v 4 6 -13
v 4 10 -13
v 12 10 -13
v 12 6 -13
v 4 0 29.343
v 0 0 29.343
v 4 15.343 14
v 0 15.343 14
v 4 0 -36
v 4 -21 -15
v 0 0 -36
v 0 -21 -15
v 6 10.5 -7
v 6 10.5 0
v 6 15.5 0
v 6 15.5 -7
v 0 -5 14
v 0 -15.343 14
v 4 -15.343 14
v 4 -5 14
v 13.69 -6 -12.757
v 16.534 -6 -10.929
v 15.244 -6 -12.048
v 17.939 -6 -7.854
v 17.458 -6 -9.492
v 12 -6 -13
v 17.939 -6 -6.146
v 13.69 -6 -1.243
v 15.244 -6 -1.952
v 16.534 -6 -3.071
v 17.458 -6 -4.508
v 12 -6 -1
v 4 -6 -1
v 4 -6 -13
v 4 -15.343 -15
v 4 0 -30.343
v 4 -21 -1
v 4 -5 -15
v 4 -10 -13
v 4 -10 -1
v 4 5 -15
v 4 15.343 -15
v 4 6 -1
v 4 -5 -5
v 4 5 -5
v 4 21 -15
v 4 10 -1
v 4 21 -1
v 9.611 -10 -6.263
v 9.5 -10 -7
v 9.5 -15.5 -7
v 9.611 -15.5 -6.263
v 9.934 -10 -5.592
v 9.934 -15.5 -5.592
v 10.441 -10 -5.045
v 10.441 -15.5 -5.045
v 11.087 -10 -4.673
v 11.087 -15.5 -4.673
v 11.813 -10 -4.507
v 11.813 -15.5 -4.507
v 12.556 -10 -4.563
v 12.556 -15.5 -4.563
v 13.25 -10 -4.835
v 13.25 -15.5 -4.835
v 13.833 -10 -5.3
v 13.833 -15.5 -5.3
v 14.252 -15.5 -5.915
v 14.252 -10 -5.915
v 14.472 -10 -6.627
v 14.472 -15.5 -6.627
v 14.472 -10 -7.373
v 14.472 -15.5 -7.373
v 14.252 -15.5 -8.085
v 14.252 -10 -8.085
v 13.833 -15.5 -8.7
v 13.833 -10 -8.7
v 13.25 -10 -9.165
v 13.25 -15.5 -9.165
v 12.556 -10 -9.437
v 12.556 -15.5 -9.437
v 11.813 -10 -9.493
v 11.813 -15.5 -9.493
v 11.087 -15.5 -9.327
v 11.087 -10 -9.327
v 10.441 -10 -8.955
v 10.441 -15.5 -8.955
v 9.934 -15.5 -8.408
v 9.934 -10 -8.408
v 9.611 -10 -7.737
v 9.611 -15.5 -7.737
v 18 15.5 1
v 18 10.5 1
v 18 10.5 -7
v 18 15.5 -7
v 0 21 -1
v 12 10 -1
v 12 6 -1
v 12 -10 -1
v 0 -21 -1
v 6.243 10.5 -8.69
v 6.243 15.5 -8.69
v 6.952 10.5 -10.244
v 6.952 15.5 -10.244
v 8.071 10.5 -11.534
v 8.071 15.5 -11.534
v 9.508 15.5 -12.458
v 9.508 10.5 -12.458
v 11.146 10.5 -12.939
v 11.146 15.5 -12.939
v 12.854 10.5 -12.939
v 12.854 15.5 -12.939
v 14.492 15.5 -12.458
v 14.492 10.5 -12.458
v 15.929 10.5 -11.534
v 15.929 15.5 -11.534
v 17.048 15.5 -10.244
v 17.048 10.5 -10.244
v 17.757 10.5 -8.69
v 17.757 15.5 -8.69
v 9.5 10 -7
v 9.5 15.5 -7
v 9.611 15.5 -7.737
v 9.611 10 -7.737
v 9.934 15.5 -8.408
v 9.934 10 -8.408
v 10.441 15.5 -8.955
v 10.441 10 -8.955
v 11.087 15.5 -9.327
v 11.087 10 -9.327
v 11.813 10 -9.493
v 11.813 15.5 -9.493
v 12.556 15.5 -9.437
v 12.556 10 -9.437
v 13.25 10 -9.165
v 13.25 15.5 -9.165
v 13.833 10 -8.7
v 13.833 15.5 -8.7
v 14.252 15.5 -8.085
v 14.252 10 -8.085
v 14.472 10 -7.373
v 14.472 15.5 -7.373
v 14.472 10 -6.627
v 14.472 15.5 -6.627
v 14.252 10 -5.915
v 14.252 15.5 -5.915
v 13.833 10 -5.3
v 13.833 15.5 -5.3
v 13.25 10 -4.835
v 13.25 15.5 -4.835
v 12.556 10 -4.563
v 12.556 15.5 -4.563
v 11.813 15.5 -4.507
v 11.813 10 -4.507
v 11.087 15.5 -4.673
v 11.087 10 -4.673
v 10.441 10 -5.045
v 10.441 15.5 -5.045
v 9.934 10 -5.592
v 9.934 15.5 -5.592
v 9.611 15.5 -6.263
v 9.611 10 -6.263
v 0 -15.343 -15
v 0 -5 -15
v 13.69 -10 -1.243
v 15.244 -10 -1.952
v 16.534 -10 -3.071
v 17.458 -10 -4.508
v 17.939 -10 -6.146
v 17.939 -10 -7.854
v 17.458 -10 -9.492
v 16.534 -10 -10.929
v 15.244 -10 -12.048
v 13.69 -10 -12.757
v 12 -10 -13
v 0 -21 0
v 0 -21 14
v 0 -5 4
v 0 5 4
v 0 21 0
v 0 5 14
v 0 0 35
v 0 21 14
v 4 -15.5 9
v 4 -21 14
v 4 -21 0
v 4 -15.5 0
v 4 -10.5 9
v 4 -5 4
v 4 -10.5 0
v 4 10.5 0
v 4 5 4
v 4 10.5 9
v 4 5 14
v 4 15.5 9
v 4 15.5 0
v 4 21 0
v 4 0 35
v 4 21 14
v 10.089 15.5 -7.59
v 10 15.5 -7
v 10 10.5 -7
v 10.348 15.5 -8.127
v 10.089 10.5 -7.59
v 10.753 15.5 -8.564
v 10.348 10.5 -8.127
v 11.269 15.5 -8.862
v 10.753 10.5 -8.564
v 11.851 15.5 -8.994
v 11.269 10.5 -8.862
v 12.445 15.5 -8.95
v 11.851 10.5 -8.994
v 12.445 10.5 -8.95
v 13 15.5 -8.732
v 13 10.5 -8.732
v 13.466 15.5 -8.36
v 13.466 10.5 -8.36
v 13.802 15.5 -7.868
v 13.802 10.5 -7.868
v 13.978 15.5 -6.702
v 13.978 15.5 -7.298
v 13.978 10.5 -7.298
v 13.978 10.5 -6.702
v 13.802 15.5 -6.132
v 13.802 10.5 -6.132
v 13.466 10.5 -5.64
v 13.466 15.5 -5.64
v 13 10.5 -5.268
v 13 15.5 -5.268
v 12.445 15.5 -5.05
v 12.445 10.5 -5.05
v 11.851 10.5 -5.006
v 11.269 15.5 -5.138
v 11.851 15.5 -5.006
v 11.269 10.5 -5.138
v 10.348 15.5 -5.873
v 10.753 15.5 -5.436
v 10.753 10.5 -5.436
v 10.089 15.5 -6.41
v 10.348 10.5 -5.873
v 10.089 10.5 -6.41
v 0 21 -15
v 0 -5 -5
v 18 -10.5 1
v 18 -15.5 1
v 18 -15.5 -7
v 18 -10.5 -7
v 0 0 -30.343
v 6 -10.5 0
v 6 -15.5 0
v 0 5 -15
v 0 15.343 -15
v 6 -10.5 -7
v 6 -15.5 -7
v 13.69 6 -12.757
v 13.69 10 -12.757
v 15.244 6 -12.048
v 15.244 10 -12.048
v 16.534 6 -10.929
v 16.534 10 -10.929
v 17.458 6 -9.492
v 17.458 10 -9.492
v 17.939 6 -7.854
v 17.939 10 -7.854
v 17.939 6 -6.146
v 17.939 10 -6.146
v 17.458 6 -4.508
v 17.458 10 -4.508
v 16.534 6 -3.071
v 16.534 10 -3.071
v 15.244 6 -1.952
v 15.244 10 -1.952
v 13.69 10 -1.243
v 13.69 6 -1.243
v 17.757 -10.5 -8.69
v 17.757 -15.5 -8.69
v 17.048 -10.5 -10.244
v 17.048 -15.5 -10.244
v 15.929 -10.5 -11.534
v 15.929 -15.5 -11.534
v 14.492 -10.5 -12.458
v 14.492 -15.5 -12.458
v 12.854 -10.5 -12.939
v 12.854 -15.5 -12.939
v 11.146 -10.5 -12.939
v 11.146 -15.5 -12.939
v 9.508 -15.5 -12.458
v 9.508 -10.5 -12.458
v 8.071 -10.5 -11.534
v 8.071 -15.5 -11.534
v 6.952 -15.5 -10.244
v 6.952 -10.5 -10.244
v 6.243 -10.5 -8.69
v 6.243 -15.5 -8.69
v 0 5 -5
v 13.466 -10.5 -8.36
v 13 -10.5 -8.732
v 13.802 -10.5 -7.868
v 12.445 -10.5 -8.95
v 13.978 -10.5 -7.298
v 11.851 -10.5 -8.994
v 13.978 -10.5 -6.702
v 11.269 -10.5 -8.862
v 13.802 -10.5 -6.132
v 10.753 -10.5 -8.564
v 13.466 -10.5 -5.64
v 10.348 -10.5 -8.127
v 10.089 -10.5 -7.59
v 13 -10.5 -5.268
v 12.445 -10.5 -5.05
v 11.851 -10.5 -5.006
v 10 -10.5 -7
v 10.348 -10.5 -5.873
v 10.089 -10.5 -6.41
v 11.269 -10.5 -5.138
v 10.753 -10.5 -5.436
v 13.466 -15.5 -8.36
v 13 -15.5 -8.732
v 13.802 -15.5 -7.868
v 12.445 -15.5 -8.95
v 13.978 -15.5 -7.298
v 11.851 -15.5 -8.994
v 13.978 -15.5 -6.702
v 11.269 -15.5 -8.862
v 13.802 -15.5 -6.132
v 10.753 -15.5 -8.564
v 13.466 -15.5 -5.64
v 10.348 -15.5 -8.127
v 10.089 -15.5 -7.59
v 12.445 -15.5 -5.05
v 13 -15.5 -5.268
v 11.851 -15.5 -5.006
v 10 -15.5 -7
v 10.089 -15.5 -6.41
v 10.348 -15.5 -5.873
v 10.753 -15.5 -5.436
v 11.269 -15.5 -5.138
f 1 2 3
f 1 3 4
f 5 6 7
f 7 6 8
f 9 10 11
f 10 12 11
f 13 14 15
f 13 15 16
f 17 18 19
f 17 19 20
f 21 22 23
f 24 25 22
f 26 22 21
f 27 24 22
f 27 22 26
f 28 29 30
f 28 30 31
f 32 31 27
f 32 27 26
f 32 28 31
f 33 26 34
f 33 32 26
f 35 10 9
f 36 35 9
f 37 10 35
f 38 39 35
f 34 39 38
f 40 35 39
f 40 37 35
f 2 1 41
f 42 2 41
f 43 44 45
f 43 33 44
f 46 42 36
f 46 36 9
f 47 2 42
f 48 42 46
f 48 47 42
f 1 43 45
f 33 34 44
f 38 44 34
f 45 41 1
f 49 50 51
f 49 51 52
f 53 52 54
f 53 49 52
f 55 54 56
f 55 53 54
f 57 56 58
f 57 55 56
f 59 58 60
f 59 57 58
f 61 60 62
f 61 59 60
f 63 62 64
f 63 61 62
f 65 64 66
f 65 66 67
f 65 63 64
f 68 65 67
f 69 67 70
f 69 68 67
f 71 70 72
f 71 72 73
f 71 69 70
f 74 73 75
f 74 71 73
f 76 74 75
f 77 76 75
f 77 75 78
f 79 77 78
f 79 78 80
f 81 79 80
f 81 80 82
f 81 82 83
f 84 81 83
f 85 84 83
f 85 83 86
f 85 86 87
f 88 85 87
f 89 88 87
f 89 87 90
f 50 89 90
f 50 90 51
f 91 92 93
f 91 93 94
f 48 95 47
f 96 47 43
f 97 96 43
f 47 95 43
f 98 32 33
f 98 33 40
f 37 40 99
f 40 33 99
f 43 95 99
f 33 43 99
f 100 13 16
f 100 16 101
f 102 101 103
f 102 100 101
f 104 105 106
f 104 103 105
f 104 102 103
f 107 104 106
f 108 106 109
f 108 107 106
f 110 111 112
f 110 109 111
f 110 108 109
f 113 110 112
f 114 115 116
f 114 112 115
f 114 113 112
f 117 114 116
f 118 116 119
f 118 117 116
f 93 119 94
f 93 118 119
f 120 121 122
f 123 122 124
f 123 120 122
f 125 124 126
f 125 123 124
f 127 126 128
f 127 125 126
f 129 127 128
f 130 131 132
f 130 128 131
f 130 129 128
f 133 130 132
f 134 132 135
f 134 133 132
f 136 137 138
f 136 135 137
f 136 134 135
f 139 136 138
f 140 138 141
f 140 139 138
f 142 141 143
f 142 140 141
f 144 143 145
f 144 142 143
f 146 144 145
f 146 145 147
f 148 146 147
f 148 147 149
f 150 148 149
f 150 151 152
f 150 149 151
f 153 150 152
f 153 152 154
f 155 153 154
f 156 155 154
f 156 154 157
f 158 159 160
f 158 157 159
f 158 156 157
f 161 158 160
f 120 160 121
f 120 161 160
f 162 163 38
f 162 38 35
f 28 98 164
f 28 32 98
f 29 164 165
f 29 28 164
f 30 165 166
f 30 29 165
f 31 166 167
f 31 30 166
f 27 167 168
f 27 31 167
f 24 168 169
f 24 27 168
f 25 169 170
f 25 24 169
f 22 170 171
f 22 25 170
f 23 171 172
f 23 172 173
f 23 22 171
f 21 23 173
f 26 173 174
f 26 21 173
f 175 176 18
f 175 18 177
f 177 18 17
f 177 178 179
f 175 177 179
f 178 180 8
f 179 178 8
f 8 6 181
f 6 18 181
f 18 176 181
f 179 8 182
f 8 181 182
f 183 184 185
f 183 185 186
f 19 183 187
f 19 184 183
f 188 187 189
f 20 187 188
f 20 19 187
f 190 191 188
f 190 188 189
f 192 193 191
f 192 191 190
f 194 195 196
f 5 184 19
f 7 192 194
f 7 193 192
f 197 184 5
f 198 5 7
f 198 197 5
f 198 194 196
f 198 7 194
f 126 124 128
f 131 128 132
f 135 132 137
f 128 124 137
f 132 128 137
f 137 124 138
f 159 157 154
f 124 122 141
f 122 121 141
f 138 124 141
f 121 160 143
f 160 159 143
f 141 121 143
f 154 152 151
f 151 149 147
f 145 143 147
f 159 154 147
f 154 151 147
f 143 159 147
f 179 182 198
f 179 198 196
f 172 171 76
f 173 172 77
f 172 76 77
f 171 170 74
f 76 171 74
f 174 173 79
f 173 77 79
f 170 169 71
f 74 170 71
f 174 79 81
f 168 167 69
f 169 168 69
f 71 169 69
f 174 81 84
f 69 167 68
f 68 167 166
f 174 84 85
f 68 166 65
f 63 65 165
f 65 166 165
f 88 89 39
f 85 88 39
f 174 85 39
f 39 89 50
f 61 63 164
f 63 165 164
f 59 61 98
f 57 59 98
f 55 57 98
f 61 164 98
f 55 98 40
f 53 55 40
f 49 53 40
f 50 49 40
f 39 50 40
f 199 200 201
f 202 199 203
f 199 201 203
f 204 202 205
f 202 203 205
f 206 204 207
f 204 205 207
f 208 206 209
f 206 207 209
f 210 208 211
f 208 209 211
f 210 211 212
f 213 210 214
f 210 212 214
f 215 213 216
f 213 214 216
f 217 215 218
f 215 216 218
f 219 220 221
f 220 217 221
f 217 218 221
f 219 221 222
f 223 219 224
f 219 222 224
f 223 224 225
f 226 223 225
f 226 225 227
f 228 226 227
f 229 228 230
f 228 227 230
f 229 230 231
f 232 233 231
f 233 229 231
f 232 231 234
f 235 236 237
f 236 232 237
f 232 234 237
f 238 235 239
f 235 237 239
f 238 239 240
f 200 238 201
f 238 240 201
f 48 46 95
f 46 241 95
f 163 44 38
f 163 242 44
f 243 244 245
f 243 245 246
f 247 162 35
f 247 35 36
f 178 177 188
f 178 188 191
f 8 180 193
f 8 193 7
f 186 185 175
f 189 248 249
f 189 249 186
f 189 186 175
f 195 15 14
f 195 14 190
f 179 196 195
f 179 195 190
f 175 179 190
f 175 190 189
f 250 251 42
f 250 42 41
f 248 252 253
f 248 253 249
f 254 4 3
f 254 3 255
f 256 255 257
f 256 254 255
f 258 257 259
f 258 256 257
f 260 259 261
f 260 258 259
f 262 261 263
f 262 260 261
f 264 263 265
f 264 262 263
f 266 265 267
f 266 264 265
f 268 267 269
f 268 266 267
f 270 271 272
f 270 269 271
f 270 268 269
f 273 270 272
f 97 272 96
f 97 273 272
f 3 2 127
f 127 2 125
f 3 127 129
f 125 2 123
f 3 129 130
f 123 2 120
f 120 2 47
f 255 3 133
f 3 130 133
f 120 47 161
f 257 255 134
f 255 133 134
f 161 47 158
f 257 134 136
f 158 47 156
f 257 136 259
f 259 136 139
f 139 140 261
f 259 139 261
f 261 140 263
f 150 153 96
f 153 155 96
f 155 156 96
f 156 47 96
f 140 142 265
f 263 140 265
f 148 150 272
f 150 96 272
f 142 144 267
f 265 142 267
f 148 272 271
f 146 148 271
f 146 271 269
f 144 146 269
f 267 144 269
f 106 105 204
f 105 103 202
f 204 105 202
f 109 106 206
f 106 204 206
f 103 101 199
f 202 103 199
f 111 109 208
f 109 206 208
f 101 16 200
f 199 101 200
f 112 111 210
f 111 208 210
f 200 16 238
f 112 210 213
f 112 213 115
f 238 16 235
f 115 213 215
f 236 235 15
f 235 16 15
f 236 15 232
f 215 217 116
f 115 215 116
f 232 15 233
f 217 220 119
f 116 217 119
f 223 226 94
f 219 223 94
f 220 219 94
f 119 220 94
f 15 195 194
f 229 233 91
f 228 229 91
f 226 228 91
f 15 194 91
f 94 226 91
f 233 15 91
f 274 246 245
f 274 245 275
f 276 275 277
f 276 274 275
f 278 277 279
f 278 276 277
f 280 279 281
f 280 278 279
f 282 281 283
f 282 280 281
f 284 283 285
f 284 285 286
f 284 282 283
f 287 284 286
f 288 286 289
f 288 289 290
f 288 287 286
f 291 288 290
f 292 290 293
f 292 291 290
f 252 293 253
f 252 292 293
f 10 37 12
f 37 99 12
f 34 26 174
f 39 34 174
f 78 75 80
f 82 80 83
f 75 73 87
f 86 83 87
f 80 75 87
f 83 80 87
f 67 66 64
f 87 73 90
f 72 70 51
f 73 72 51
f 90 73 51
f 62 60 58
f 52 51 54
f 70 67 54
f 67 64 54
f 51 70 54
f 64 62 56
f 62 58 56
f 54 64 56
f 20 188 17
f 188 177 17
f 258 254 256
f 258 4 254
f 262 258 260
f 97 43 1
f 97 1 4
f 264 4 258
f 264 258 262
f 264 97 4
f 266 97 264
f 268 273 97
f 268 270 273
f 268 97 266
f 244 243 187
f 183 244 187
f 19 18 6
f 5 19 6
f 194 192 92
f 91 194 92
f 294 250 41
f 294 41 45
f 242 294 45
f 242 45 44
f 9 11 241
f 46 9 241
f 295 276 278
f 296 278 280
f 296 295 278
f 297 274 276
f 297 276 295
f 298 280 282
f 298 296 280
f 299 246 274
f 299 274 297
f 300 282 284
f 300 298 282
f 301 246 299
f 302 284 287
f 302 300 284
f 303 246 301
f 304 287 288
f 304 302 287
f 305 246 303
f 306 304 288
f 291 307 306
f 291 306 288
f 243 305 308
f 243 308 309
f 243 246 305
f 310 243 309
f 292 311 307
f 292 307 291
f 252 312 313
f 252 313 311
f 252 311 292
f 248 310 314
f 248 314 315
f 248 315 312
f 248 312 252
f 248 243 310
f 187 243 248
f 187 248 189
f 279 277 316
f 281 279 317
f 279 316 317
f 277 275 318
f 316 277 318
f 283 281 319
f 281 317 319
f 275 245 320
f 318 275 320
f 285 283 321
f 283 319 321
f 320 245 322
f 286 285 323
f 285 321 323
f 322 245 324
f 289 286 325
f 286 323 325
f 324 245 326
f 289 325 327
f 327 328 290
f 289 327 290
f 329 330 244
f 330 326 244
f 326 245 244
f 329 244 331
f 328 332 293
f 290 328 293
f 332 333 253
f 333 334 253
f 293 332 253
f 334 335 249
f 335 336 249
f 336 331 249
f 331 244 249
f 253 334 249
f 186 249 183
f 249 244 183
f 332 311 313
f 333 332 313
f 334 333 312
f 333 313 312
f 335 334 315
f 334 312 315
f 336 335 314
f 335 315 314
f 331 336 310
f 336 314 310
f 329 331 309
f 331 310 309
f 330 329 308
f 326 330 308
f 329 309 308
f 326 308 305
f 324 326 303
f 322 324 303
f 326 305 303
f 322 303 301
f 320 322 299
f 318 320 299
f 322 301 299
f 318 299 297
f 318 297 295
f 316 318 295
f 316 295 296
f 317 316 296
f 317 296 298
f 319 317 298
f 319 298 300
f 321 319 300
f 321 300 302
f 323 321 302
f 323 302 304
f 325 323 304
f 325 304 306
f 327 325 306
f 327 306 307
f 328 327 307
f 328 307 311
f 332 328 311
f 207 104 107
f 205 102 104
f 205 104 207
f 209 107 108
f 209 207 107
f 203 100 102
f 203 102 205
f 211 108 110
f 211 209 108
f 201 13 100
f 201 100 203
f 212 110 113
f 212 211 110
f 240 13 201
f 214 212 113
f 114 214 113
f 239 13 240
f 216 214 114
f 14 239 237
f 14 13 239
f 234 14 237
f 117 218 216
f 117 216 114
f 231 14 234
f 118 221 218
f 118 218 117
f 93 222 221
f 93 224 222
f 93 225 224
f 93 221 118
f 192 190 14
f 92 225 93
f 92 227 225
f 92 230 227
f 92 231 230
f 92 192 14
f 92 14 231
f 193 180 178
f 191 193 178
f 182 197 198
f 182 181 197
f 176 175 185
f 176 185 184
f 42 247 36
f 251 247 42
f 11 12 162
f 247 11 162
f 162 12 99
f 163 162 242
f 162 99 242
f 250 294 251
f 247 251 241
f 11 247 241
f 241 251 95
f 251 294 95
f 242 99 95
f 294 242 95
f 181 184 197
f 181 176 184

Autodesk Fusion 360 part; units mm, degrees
sketch "Sketch1" plane through (0, 0, 0) normal (1, 0, 0) x (0, 1, 0)
  line L0 (0, 0) -> (0, 35)
  line L1 (-21, 0) -> (-21, 14)
  line L2 (-15.3431, 14) -> (-5, 14)
  line L3 (-21, 14) -> (0, 35)
  line L4 (-15.3431, 14) -> (0, 29.3431)
  line L5 (-5, 4) -> (0, 4)
  line L6 (-5, 4) -> (-5, 14)
  line L7 (-15.5, 9) -> (-15.5, 0)
  line L8 (-10.5, 9) -> (-10.5, 0)
  line L9 (-15.5, 9) -> (-10.5, 9)
  line L10 (0, 0) -> (-10.5, 0)
  line L11 (-15.5, 0) -> (-21, 0)
  line L12 (-15.5, 0) -> (-15.5, -7)
  line L13 (-15.5, -7) -> (-10.5, -7)
  line L14 (-10.5, -7) -> (-10.5, 0)
  point P0 (0, 4)
  point P1 (-5, 4)
  dimension "d1" = 35
  dimension "d2" = 21
  dimension "d3" = 14
  dimension "d5" = 4
  dimension "d6" = 5
  dimension "d7" = 9
  dimension "d8" = -5
  dimension "d9" = 7
  dimension "d49" = 10.5
extrude "Extrude1" add sketch "Sketch1" along normal blind 4 contours L0 L1 L2 L3 L4 L5 L6 L7 L8 L9 L10 L11 makes body 1
extrude "Extrude2" add sketch "Sketch1" along normal blind 4 contours L7 L8 L9 L12 L13 L14 bodies 1
extrude "Extrude3" add sketch "Sketch1" along normal blind 14 from surface at 4 contours L7 L8 L9 L12 L13 L14 bodies 1
sketch "Sketch2" plane through (0, -10.5, 0) normal (0, 1, 0) x (-1, 0, 0)
  line L0 (0, 0) -> (-4, 0)
  line L1 (-4, 0) -> (-4, 9)
  line L2 (-4, 9) -> (-18, 9)
  line L3 (-18, 9) -> (-18, -7)
  line L4 (-18, -7) -> (0, -7)
  line L5 (0, -7) -> (0, 0)
  line L6 (-18, 1) -> (-4, 9)
  line L7 (-6, -7) -> (-6, 0)
  line L8 (-6, 0) -> (0, 0)
  line L9 (-18, -7) -> (-6, -7)
  circle A0 centre (-12, -7) radius 2
  arc A1 (-18, -7) -> (-6, -7) centre (-12, -7) ccw
  point P0 (-18, 1)
  point P1 (0, -7)
  dimension "d17" = 6
  dimension "d18" = 8
  dimension "d19" = 4
extrude "Extrude4" cut sketch "Sketch2" against normal blind 5 contours L0 L4 L5 L7 L8 | L2 L3 L6 | L4 L9 A0 picked at (-11.4527, -6.1579) bodies 1
extrude "Extrude5" add sketch "Sketch2" against normal blind 5 contours L4 L9 A0 A1 bodies 1
mirror "Mirror1" about plane through (0, 0, 29.3431) normal (0, 1, 0) of bodies 1 makes body 2
combine "Combine1" operation add target body 1 tool bodies 2
sketch "Sketch1 (2)" plane through (0, 0, 0) normal (1, 0, 0) x (0, 1, 0) in component "Component"
  line L0 (0, 0) -> (0, 35)
  line L1 (0, 35) -> (-21, 35)
  line L2 (-21, 35) -> (-21, 21)
  line L3 (-21, 21) -> (0, 0)
  line L4 (0, 31) -> (-5, 31)
  line L5 (-15.3431, 21) -> (0, 5.6569)
  line L6 (-5, 31) -> (-5, 21)
  line L7 (-5, 21) -> (-15.3431, 21)
  line L8 (-10, 35) -> (-10, 23)
  line L9 (-6, 35) -> (-6, 23)
  line L10 (-6, 23) -> (-10, 23)
  point P0 (-10, 35)
  dimension "d25" = 35
  dimension "d26" = 21
  dimension "d27" = 14
  dimension "d29" = 4
  dimension "d30" = 5
  dimension "d31" = 10
  dimension "d32" = 10
  dimension "d33" = 12
  dimension "d34" = -4
extrude "Extrude1'" add sketch "Sketch1 (2)" along normal blind 4 separate body contours L0 L1 L2 L3 L4 L5 L6 L7 L8 L9 L10 | L1 L8 L9 L10 makes body 3 in component "Component"
extrude "Extrude2'" add sketch "Sketch1 (2)" along normal blind 12 contours L1 L8 L9 L10 bodies 3 in component "Component"
sketch "Sketch2 (2)" plane through (0, -6, 0) normal (0, 1, 0) x (-1, 0, 0) in component "Component"
  line L0 (-4, 23) -> (-4, 35)
  line L1 (-4, 35) -> (-12, 35)
  line L2 (-12, 35) -> (-12, 23)
  line L3 (-12, 23) -> (-4, 23)
  circle A0 centre (-12, 29) radius 2.5
  arc A1 (-12, 35) -> (-12, 23) centre (-12, 29) ccw
  dimension "d40" = 5
  dimension "d50" = 6
extrude "Extrude3'" add sketch "Sketch2 (2)" against normal blind 4 contours L2 A0 A1 bodies 3 in component "Component"
extrude "Extrude4'" add sketch "Sketch2 (2)" against normal blind 5.5 from surface at -4 separate body contours L2 A0 | L2 A0 makes body 4 in component "Component"
extrude "Extrude5'" add sketch "Sketch2 (2)" against normal blind 9.5 contours L2 A0 picked at (-12.9366, 28.4168) bodies 4 3 in component "Component"
mirror "Mirror1'" about plane through (0, 0, 31) normal (0, 1, 0) of bodies 4 makes body 5 in component "Component"
combine "Combine1'" operation add target body 4 tool bodies 5 in component "Component"
copy_body "Body->Comp1" bodies 1 removing the originals makes body 6 in component "Component'"
component "Component" placed x (1, 0, 0) y (0, 1, 0) z (0, 0, 1) at (0, 0, -36)
component "Component'" placed x (1, 0, 0) y (0, 1, 0) z (0, 0, 1) at (0, 0, 0)
